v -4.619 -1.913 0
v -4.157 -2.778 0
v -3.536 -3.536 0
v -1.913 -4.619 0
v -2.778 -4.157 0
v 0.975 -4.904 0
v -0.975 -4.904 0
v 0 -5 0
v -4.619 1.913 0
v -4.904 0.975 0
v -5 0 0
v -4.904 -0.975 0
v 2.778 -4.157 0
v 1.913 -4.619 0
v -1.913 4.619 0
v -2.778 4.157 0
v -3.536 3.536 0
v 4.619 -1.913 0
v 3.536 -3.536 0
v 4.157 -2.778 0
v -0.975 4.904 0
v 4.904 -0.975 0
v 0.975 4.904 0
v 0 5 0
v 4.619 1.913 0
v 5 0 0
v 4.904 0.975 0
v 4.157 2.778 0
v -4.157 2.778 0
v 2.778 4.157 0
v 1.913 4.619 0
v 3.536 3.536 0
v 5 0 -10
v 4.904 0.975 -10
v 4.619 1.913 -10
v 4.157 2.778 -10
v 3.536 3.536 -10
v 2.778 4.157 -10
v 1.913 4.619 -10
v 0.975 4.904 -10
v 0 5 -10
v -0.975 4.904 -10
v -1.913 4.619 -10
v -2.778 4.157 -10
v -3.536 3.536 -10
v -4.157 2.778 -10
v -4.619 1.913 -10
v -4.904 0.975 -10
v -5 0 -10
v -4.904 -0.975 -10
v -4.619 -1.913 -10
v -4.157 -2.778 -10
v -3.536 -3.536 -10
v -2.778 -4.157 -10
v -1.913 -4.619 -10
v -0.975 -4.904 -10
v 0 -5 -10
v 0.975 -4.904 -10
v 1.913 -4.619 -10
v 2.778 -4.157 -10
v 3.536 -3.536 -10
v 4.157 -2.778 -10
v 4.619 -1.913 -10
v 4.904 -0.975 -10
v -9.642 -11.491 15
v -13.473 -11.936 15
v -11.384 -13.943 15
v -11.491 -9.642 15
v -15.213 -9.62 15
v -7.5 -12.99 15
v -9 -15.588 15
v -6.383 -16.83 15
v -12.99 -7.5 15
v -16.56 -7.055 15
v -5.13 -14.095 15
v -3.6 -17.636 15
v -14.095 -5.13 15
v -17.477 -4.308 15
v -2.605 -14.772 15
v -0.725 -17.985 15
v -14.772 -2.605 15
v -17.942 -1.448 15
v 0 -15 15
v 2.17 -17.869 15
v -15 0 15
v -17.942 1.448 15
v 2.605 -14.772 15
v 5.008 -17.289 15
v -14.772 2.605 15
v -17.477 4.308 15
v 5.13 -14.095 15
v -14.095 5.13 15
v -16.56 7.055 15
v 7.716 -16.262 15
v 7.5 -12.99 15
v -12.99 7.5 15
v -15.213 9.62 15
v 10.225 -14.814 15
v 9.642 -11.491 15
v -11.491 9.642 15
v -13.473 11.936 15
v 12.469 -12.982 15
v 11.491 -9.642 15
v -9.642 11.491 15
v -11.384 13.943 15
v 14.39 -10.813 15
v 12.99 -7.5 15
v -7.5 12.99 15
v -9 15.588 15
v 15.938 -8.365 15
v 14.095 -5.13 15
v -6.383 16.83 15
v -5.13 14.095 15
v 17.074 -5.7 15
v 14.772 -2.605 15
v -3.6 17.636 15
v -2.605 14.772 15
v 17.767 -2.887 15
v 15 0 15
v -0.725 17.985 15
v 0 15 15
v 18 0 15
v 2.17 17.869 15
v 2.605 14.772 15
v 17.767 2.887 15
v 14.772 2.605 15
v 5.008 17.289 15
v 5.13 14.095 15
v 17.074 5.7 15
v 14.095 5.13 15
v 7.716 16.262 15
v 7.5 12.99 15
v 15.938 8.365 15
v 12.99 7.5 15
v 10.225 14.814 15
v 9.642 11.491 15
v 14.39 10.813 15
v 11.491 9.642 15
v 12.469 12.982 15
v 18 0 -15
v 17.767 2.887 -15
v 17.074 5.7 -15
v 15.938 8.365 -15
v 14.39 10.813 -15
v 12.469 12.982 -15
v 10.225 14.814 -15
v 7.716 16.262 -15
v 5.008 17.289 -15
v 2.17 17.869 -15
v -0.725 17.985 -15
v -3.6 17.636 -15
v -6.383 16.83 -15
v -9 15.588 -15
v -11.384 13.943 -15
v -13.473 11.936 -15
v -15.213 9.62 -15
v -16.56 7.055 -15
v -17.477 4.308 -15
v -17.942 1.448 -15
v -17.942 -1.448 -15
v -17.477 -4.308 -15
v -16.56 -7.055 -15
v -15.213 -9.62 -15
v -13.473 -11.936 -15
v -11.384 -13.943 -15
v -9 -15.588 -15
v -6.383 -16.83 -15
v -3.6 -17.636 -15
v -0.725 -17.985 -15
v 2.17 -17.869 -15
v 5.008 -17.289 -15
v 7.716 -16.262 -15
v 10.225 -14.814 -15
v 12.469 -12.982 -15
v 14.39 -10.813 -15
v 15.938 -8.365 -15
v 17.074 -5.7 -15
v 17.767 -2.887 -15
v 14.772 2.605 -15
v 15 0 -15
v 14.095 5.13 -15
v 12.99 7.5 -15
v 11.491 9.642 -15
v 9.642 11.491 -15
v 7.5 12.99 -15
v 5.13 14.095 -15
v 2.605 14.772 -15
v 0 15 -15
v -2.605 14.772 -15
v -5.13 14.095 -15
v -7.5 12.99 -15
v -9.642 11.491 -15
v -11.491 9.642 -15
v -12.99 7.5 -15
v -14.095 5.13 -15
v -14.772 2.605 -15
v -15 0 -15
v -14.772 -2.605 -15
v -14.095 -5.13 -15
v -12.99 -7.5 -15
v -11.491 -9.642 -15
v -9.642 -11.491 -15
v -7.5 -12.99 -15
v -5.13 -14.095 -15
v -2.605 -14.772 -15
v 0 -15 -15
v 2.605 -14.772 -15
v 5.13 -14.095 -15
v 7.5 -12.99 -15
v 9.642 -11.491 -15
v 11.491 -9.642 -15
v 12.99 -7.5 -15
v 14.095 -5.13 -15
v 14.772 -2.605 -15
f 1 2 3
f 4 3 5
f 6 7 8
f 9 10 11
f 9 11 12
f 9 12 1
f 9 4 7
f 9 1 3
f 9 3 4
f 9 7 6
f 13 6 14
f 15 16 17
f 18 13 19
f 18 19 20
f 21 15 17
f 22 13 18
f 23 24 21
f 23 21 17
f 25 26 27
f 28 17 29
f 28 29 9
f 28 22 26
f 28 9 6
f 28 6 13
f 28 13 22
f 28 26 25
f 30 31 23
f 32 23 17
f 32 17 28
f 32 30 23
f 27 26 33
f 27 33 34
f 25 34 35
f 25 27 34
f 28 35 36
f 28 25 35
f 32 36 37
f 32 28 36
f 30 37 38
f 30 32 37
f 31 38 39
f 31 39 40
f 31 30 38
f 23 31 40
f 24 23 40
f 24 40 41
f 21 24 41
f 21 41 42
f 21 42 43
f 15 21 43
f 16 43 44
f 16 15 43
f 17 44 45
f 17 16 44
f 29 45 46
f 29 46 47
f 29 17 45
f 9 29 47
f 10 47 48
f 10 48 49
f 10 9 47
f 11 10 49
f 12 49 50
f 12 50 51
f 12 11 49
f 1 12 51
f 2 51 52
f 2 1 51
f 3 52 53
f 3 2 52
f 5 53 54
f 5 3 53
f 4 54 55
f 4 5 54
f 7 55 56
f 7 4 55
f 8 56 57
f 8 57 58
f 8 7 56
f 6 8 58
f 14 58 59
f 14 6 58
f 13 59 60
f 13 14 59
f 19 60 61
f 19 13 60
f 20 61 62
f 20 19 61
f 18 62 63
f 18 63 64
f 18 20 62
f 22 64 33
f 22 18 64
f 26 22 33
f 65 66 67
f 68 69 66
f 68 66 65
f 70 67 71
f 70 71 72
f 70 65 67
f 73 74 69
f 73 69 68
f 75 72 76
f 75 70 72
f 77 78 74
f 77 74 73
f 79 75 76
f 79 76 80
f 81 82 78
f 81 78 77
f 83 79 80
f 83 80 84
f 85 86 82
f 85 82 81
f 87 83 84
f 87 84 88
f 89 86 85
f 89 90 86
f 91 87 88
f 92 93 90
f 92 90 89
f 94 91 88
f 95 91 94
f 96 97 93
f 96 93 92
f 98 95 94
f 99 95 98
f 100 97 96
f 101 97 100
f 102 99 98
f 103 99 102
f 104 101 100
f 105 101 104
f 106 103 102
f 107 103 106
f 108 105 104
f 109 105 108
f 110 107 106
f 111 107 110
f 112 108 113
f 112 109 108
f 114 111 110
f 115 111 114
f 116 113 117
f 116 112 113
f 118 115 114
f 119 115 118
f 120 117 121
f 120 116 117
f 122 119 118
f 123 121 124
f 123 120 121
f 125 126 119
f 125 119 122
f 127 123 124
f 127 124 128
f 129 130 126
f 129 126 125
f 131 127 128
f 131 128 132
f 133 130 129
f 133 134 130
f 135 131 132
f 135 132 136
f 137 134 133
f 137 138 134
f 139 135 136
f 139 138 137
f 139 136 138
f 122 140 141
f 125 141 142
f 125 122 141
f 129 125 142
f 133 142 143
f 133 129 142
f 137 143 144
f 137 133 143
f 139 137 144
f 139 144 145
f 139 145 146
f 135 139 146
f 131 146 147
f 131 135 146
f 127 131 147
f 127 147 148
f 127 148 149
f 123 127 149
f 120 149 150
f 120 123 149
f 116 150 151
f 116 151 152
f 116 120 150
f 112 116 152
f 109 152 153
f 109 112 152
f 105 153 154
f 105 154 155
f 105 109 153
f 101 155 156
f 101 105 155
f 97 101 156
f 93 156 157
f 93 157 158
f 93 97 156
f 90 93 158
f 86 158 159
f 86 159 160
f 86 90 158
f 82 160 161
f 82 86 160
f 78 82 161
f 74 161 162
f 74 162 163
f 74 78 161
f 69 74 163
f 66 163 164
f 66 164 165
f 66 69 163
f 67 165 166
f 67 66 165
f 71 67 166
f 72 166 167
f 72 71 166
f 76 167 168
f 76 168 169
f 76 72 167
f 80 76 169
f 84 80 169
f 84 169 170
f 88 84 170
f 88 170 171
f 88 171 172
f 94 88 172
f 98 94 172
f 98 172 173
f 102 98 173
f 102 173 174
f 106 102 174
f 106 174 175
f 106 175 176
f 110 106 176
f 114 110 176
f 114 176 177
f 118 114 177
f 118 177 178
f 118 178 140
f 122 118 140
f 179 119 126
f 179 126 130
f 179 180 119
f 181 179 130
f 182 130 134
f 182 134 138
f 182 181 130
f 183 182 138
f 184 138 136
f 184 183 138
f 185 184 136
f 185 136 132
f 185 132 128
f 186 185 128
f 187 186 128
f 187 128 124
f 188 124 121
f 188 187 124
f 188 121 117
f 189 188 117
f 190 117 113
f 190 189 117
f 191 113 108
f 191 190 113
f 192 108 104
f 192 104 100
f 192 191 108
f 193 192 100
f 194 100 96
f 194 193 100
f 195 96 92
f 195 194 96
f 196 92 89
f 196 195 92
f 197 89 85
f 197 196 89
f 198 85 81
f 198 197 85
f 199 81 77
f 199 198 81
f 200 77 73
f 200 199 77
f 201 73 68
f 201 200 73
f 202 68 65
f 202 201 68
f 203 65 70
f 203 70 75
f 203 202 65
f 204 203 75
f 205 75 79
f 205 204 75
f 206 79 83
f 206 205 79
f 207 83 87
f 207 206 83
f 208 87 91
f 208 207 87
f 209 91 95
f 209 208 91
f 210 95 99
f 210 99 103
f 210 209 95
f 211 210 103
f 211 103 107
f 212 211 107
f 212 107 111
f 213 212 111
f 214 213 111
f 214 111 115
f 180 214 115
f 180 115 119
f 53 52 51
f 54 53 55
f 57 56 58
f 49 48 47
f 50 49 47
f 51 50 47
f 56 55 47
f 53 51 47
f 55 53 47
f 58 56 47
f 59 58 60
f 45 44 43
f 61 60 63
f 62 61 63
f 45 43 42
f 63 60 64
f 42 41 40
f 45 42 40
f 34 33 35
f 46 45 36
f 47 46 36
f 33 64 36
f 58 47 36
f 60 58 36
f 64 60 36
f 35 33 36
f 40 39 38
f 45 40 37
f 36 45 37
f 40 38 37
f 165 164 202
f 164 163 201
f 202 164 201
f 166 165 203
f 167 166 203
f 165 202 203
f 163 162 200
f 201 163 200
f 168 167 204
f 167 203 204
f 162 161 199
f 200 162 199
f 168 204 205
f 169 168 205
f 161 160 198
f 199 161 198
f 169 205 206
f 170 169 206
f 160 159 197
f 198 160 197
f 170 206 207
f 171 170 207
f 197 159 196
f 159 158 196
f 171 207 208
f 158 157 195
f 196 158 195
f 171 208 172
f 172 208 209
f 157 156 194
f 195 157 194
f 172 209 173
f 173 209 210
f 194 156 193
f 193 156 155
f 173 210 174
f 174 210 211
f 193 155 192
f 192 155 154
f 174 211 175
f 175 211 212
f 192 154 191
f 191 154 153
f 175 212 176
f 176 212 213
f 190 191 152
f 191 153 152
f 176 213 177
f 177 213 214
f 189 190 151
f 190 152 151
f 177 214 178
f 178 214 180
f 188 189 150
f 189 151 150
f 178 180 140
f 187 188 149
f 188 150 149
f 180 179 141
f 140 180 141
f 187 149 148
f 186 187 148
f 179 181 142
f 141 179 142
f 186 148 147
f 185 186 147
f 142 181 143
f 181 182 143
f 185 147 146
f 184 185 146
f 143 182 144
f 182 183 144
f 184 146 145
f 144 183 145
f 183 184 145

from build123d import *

# Parameters (mm, degrees)
SKETCH1_R           = 18
SKETCH1_R_2         = 15
EXTRUDE_THIN1_DEPTH = 15
SKETCH2_R           = 5
BOSS_EXTRUDE1_DEPTH = 10


with BuildPart() as part:
    # Sketch1 → Extrude-Thin1 (new body, symmetric)
    with BuildSketch(Plane.XY):
        Circle(SKETCH1_R)
        Circle(SKETCH1_R_2, mode=Mode.SUBTRACT)
    extrude(amount=EXTRUDE_THIN1_DEPTH, both=True)


with BuildPart() as body_2:
    # Sketch2 → Boss-Extrude1 (new body)
    with BuildSketch(Plane.XY):
        Circle(SKETCH2_R)
    extrude(amount=-BOSS_EXTRUDE1_DEPTH)


solid = Compound([part.part, body_2.part])
